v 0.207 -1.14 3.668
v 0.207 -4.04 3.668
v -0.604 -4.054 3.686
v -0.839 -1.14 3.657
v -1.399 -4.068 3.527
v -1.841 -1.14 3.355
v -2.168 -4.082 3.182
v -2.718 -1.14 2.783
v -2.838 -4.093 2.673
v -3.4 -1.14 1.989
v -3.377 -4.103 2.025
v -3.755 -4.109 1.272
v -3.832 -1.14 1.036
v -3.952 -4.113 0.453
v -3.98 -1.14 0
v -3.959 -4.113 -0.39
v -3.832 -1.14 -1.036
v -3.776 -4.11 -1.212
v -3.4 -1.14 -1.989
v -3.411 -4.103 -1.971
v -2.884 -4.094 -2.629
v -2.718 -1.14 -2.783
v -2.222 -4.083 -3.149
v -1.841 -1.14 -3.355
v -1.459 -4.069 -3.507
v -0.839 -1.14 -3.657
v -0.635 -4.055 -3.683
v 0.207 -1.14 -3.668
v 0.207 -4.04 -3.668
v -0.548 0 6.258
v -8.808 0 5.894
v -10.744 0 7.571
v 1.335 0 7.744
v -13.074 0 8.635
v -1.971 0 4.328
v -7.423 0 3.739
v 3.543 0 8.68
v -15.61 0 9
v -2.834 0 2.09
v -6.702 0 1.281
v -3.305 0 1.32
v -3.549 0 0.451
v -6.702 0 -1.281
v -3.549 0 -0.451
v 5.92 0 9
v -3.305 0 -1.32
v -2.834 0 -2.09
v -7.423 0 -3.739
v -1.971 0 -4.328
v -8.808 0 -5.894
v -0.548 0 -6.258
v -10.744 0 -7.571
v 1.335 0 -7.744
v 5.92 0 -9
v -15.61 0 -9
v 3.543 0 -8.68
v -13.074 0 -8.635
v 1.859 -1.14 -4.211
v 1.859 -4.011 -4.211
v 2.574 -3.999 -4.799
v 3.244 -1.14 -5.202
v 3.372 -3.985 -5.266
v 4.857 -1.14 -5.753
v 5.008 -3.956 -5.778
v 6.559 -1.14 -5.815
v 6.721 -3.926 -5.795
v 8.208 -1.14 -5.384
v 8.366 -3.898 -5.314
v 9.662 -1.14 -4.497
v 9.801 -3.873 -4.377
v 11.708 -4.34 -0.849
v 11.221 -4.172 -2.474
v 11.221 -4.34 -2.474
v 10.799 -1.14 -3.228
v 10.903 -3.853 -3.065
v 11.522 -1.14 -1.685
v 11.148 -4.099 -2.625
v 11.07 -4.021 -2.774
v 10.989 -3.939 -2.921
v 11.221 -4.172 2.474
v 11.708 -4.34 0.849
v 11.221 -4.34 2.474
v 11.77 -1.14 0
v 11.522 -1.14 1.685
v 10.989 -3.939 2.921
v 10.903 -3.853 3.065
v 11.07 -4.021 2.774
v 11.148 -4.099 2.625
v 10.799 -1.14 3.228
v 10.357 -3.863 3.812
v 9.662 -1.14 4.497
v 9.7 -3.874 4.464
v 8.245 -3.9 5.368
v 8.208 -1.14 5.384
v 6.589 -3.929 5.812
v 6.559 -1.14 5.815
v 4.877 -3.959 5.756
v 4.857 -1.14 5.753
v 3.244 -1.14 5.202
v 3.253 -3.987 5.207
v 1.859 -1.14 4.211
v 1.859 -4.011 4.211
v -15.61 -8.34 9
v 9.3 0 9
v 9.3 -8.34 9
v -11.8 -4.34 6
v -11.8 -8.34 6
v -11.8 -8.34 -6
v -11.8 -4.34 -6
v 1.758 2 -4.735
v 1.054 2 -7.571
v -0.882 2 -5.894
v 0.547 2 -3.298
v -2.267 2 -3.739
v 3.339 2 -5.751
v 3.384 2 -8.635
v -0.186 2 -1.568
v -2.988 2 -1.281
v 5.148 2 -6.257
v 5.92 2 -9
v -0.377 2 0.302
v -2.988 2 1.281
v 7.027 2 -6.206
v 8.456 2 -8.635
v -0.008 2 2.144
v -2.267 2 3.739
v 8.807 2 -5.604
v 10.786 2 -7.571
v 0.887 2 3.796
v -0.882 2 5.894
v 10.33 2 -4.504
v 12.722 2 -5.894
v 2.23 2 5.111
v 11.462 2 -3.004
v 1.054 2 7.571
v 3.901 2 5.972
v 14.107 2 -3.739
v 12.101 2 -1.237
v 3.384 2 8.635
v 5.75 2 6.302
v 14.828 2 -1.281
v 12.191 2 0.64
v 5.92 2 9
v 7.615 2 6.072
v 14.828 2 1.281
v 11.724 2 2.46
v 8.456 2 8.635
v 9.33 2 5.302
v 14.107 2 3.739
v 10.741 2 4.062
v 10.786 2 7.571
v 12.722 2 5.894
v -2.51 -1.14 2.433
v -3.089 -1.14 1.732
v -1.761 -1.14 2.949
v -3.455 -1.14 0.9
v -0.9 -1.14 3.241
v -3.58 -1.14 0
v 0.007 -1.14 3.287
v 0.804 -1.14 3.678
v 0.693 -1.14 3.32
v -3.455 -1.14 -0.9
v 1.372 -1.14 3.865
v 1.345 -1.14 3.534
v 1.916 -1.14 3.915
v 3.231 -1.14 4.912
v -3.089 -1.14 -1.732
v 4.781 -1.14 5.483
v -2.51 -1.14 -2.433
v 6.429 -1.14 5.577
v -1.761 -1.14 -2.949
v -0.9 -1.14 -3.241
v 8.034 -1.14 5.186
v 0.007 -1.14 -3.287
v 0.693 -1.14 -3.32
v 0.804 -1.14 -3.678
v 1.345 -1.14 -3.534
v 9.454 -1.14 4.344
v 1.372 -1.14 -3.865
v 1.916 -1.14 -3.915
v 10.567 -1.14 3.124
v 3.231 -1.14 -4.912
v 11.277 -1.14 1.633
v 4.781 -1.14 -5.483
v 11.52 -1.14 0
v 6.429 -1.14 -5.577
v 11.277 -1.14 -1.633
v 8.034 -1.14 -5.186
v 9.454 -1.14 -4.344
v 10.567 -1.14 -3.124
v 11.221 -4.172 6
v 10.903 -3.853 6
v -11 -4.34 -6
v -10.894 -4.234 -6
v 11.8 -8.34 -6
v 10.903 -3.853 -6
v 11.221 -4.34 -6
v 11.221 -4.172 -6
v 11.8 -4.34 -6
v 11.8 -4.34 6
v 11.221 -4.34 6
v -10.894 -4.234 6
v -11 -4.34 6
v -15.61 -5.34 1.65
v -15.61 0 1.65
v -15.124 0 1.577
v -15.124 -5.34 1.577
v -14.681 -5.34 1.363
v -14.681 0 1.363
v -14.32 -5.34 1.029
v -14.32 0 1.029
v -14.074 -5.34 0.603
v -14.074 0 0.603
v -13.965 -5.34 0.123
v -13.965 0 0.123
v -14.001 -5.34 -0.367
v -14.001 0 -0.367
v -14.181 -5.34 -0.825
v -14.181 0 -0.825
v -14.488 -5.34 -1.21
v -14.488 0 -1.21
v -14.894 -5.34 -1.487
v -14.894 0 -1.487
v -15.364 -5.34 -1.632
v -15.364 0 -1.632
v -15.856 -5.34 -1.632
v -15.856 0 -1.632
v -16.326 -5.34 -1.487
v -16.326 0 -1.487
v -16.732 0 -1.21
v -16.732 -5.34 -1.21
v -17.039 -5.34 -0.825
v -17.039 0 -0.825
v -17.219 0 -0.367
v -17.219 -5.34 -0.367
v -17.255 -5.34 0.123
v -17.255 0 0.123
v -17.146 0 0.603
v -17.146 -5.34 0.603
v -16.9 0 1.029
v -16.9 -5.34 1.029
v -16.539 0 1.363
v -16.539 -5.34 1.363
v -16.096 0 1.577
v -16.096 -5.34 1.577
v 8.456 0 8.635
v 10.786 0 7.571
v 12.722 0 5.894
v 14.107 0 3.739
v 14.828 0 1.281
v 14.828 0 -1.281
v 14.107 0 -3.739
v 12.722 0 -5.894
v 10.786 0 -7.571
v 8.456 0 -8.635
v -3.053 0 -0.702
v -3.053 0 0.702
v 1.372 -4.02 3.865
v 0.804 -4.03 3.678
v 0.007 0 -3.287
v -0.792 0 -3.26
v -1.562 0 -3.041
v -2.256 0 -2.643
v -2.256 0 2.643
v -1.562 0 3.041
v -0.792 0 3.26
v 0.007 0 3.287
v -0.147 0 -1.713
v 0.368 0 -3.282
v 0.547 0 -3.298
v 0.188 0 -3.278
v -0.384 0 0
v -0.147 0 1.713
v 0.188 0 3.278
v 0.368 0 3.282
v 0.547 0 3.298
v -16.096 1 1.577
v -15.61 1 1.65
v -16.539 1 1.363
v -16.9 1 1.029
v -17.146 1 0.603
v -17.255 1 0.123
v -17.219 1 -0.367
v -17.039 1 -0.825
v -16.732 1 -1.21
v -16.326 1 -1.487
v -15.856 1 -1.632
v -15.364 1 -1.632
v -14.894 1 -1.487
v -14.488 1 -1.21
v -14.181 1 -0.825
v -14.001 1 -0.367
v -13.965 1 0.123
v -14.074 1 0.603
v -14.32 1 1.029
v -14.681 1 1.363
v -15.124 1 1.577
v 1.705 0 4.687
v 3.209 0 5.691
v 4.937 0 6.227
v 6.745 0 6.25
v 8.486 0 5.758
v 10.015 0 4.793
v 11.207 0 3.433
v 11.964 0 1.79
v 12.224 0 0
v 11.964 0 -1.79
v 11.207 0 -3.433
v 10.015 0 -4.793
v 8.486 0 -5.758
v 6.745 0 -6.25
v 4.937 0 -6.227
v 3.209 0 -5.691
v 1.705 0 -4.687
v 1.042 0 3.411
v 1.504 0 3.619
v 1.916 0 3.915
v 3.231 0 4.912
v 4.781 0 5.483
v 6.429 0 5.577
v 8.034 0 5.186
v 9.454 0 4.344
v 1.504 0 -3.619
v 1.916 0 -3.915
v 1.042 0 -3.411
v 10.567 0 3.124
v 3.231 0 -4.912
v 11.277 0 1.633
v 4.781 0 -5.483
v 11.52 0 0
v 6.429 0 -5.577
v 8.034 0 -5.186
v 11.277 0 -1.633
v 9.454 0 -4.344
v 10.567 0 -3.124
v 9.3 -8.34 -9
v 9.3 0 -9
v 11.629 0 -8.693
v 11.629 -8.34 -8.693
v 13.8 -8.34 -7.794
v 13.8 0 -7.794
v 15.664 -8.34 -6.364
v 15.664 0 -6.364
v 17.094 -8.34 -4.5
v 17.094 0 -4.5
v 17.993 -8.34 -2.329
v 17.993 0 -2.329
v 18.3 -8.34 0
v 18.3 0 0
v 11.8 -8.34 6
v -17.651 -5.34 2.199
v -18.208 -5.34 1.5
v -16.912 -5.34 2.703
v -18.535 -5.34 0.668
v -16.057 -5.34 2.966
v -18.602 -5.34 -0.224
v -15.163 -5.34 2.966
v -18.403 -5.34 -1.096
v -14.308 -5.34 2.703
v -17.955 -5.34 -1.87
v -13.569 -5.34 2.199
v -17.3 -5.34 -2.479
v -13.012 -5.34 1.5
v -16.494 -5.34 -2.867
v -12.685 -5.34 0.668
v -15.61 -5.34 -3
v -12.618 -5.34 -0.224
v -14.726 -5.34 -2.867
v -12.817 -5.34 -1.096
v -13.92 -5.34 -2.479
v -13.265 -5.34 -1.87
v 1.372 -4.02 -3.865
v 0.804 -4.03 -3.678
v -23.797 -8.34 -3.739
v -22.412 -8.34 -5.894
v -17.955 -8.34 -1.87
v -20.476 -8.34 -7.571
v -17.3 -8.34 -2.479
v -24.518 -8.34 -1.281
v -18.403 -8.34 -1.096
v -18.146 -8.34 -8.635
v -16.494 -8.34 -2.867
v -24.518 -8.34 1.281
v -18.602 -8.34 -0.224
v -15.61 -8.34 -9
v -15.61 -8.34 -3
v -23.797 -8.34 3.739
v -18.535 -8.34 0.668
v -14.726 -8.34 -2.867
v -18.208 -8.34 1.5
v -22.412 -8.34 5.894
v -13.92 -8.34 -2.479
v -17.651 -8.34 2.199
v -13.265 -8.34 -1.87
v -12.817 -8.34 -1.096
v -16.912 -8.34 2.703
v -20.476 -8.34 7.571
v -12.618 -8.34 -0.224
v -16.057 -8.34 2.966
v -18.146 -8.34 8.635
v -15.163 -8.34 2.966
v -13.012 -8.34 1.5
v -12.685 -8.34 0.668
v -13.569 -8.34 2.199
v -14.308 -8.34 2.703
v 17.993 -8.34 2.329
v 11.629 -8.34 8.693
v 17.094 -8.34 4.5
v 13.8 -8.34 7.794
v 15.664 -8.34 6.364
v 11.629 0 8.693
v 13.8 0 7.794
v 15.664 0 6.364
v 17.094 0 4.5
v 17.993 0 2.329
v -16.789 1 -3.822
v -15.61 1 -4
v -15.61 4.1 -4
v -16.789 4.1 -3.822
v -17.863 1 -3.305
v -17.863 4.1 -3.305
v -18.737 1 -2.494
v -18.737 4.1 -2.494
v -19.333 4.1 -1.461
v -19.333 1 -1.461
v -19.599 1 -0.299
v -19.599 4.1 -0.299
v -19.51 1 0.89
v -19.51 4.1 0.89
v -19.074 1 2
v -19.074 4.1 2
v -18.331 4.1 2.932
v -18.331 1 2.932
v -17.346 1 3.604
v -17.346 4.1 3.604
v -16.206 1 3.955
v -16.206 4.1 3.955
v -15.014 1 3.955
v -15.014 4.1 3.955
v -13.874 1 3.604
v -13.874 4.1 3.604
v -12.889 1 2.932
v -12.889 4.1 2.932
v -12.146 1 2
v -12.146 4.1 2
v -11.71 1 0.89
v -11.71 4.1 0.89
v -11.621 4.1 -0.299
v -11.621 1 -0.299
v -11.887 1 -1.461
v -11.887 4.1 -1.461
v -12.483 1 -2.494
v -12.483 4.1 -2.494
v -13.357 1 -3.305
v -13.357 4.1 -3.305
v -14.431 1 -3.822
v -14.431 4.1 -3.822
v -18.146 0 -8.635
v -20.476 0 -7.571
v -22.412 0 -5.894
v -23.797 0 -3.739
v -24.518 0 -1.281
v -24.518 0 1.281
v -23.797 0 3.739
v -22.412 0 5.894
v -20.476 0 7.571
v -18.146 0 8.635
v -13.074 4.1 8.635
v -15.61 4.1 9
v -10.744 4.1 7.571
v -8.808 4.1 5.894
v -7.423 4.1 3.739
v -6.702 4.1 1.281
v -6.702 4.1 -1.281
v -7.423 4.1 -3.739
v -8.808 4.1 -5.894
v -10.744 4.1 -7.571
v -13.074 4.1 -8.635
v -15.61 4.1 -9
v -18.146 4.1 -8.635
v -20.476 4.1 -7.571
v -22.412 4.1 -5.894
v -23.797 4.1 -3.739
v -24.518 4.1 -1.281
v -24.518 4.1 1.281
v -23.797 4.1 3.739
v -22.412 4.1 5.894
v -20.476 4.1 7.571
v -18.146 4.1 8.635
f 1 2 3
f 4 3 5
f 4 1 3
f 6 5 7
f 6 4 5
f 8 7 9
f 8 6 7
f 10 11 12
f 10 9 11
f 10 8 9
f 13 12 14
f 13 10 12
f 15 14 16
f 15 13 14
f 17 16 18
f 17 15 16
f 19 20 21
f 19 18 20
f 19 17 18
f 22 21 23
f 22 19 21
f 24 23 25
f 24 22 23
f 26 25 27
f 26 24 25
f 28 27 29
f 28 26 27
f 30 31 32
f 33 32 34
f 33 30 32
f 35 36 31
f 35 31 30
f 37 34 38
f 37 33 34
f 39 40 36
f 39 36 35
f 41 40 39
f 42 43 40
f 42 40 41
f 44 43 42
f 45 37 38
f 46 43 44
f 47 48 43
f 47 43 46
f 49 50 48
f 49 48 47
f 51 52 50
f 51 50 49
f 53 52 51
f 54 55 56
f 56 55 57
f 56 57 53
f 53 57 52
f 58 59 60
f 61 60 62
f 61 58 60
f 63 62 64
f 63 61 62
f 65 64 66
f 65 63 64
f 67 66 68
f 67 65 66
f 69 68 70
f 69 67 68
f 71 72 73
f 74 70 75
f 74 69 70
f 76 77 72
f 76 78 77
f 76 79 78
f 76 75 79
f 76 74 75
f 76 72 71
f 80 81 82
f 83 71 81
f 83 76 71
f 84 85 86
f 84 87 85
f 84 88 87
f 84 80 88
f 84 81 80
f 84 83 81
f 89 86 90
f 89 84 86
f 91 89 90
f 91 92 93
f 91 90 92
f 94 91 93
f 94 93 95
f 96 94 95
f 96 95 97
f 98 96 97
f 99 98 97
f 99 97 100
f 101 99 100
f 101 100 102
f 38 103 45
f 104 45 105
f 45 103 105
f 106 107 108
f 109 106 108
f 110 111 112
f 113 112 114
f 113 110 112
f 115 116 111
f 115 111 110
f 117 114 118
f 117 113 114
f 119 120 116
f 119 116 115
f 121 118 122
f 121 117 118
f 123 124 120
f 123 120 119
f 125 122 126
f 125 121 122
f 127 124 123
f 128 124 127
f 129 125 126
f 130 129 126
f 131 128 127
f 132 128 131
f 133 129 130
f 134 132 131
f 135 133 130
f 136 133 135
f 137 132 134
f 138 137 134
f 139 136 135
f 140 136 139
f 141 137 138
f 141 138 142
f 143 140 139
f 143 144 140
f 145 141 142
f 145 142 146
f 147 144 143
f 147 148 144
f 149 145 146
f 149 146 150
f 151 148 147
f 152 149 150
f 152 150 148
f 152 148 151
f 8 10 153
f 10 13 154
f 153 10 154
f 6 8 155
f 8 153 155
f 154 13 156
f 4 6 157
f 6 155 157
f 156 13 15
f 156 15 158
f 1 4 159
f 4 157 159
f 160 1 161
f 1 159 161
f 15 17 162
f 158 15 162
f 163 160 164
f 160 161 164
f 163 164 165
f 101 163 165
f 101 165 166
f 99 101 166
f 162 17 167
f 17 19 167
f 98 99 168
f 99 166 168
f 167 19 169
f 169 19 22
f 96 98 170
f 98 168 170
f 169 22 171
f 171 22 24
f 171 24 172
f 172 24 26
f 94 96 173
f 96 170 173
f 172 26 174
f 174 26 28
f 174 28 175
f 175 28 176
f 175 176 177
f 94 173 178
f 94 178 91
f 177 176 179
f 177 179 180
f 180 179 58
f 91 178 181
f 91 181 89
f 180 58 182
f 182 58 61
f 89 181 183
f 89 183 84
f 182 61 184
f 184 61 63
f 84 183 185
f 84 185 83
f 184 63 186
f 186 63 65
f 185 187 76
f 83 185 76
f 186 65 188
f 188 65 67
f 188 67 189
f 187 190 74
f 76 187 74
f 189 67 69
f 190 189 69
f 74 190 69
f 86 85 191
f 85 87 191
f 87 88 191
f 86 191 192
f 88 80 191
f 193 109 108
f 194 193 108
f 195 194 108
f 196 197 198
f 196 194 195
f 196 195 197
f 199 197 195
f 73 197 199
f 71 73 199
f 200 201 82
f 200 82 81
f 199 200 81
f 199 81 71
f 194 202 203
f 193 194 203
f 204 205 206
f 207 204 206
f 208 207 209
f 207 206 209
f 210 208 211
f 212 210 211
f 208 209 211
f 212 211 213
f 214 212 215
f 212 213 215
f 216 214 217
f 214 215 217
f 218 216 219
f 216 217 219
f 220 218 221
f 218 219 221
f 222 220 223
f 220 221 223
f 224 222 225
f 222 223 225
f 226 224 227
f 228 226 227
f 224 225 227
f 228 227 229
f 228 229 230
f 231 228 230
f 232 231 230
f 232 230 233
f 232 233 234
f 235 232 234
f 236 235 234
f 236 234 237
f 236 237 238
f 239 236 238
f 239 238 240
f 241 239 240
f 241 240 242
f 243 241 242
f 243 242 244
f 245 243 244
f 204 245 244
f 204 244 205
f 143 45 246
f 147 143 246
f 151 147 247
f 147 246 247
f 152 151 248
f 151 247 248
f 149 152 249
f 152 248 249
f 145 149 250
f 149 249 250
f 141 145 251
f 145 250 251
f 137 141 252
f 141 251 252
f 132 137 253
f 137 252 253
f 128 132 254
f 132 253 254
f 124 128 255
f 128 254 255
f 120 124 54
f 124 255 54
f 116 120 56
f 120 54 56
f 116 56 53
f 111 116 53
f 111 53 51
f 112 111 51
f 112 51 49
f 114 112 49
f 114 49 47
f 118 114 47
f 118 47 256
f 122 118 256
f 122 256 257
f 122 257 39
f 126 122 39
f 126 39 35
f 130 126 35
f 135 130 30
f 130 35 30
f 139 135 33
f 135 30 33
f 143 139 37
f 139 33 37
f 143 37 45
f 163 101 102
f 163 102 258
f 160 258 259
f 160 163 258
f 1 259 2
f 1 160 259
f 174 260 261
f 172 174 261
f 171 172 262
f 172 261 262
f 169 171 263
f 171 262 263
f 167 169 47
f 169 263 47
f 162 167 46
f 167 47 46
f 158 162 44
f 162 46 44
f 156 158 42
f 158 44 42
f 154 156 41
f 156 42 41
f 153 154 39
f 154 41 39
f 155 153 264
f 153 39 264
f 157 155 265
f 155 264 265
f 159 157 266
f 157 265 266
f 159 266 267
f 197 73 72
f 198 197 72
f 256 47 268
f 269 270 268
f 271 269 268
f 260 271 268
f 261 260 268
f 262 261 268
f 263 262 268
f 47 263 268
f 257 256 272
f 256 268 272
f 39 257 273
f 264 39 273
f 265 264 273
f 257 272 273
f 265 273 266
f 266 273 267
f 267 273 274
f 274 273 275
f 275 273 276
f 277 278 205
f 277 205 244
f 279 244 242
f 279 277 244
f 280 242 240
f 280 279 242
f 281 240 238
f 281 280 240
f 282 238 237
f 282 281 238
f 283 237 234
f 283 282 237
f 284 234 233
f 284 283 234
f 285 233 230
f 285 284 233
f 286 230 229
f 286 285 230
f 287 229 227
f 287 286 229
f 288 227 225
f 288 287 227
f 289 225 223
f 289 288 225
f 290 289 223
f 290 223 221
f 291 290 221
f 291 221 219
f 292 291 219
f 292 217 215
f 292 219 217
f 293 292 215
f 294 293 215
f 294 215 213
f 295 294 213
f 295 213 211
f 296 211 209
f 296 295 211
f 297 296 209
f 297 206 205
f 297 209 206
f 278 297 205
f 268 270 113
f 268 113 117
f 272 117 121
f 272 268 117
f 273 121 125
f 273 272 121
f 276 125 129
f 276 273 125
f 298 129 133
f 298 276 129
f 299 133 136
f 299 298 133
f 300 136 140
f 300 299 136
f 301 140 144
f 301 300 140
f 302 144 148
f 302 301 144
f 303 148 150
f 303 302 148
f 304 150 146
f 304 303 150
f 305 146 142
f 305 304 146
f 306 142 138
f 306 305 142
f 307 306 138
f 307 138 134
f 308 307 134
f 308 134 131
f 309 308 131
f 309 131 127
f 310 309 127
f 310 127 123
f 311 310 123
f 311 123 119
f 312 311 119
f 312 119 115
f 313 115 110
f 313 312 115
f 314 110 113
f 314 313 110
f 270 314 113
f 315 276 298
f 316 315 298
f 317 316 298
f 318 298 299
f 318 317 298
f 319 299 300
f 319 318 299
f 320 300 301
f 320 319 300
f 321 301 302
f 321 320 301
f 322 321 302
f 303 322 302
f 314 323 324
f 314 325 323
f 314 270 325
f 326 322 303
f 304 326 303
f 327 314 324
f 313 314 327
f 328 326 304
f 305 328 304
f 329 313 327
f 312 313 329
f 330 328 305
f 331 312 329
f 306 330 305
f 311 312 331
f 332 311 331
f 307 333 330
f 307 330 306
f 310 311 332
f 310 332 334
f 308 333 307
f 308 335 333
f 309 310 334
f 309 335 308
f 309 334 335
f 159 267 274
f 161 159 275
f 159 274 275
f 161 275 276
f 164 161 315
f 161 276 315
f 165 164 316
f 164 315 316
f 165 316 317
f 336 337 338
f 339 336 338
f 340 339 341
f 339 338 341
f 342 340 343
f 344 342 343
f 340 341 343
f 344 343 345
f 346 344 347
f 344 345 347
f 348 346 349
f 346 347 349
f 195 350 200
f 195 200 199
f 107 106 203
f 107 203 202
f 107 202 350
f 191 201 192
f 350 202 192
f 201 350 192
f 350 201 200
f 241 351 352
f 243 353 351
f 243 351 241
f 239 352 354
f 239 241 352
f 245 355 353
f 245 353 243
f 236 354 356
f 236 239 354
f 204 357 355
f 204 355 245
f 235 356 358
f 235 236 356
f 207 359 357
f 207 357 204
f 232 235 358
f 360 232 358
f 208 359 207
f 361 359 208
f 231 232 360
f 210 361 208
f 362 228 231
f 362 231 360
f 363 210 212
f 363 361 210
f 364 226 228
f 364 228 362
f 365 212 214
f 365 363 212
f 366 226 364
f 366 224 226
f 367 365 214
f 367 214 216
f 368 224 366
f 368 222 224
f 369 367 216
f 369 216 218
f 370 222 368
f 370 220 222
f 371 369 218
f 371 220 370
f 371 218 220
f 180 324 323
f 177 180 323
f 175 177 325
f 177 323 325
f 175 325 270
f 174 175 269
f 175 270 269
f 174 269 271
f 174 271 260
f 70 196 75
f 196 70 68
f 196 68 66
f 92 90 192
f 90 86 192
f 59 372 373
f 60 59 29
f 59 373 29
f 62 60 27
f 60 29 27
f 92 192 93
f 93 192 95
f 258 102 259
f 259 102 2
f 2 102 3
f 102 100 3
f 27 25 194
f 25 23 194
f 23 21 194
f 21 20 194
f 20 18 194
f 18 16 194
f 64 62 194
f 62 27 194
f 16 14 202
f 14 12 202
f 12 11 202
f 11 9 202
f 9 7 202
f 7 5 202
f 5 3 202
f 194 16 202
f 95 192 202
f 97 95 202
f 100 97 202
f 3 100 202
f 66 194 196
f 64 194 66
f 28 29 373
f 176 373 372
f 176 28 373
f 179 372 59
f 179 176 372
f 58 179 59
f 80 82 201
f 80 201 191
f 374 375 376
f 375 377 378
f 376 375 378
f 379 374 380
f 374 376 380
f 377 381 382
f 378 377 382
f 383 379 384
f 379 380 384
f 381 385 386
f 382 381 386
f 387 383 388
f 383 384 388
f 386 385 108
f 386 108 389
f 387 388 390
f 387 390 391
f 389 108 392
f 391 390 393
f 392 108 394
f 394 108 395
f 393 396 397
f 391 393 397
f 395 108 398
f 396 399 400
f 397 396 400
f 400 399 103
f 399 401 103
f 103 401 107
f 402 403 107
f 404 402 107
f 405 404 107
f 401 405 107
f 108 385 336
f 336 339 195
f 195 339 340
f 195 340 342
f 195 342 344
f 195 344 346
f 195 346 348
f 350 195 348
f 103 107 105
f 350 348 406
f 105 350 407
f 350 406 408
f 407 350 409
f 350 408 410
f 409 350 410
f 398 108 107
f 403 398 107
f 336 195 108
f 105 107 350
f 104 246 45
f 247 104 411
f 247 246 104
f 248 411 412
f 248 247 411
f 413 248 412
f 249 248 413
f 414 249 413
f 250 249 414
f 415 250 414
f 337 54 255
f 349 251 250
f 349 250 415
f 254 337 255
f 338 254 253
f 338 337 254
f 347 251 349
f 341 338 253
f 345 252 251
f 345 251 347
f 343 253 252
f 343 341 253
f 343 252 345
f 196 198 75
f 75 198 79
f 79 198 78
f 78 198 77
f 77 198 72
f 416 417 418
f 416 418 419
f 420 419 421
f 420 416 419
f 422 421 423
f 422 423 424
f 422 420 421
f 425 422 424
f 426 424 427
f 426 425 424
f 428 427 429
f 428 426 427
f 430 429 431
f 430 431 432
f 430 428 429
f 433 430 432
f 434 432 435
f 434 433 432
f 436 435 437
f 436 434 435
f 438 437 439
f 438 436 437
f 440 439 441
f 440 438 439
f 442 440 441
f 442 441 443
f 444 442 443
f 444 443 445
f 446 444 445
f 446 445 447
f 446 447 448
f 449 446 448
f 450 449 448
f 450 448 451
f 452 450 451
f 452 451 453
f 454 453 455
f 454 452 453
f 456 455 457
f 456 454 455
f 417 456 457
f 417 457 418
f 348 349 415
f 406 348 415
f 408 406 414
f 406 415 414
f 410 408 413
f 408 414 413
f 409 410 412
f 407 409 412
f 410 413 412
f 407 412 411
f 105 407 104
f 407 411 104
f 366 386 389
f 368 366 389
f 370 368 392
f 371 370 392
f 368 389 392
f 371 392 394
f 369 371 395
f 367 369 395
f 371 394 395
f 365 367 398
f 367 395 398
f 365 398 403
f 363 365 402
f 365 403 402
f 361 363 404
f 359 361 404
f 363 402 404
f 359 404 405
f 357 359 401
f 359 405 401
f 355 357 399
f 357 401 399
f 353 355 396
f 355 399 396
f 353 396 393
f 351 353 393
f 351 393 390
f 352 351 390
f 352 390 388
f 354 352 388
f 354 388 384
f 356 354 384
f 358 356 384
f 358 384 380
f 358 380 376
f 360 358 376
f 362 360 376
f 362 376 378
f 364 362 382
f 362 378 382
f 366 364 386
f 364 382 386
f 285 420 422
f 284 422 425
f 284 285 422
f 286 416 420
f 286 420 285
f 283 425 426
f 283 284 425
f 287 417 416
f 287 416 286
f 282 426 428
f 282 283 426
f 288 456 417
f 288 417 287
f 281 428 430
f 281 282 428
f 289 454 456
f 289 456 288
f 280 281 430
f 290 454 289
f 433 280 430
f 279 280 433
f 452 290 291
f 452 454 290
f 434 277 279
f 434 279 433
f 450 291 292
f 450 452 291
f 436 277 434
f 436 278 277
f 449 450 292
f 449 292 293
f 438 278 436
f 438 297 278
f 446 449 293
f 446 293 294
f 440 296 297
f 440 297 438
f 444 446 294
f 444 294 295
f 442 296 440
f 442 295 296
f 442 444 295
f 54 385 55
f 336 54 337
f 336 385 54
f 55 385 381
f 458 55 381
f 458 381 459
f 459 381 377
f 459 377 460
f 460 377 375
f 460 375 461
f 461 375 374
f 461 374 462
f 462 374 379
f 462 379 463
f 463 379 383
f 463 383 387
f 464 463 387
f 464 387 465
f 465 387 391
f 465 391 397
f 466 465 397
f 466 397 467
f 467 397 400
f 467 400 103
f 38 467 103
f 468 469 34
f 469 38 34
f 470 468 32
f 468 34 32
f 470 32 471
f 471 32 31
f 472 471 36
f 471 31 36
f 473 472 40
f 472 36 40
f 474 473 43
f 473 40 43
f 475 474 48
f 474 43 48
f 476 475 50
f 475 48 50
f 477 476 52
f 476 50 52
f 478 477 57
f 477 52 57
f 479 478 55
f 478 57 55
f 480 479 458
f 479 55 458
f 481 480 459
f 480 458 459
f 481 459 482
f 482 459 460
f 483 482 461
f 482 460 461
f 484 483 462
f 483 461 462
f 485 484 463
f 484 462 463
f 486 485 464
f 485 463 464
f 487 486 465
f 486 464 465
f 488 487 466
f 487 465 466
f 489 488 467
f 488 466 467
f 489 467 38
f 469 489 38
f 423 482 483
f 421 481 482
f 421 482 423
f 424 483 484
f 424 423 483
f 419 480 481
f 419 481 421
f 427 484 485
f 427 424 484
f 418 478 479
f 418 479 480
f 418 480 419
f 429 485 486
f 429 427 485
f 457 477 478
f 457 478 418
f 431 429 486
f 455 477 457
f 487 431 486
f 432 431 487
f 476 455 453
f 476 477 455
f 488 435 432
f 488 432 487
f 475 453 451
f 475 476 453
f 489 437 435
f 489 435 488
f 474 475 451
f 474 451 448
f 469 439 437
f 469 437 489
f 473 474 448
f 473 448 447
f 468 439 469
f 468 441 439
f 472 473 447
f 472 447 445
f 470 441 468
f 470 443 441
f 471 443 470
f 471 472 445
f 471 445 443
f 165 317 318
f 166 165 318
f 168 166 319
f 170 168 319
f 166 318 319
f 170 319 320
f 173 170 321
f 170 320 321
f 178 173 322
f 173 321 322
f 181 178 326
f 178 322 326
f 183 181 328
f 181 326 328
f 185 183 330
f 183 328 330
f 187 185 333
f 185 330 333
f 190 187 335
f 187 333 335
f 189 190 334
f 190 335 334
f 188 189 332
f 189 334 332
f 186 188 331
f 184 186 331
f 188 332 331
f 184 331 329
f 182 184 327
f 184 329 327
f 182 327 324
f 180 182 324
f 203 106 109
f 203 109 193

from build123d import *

# Parameters (mm, degrees)
SKETCH_1_W          = 23.6
SKETCH_1_H          = 12
EXTRUDE_1_DEPTH     = 1.14
SKETCH_2_W          = 23.6
SKETCH_2_H          = 12
EXTRUDE_2_DEPTH     = 3.2
CUT_EXTRUDE_1_DEPTH = 18.380322206
EXTRUDE_3_DEPTH     = 3
EXTRUDE_4_DEPTH     = 3
EXTRUDE_START       = -8.34
SKETCH_6_W          = 4.5
SKETCH_6_H          = 18
EXTRUDE_6_DEPTH     = 6
SKETCH_9_W          = 18
SKETCH_9_H          = 6
EXTRUDE_8_DEPTH     = 4
SKETCH_11_W         = 8.5
SKETCH_11_H         = 18
EXTRUDE_11_DEPTH    = 2.34
SKETCH_13_W         = 18
SKETCH_13_H         = 6
EXTRUDE_12_DEPTH    = 2
SKETCH_14_W         = 18
SKETCH_14_H         = 8.34
EXTRUDE_13_DEPTH    = 8
SKETCH_15_W         = 6.5
SKETCH_15_H         = 18
EXTRUDE_14_DEPTH    = 2.34
SKETCH_12_R         = 1.65
CUT_EXTRUDE_2_DEPTH = 8.34
SKETCH_16_R         = 3
CUT_EXTRUDE_3_DEPTH = 3
SKETCH_17_R         = 9
SKETCH_17_R_2       = 6.303921286
EXTRUDE_15_DEPTH    = 2
SKETCH_18_R         = 9
EXTRUDE_16_DEPTH    = 1
CUT_EXTRUDE_START   = -10
SKETCH_19_R         = 1.65
CUT_EXTRUDE_4_DEPTH = 10
CUT_EXTRUDE_START_2 = -8.34
CUT_EXTRUDE_5_DEPTH = 8.34
CUT_EXTRUDE_6_DEPTH = 8.34
SKETCH_23_R         = 9
SKETCH_23_R_2       = 4
EXTRUDE_17_DEPTH    = 3.1


with BuildPart() as part:
    # 草图1 → 凸台-拉伸1 (new body)
    with BuildSketch(Plane(origin=(0, 0, 0), x_dir=(1, 0, 0), z_dir=(0, 1, 0))):
        Rectangle(SKETCH_1_W, SKETCH_1_H)
        with BuildLine():
            ThreePointArc((0.007454552, 3.287456445), (-3.58, 0), (0.007454552, -3.287456445))
            ThreePointArc((0.007454552, -3.287456445), (1.025918755, -3.405297551), (1.915651286, -3.91474027))
            ThreePointArc((1.915651286, -3.91474027), (11.52, 0), (1.915651286, 3.91474027))
            ThreePointArc((1.915651286, 3.91474027), (1.025918755, 3.405297551), (0.007454552, 3.287456445))
        make_face(mode=Mode.SUBTRACT)
    extrude(amount=-EXTRUDE_1_DEPTH)

    # 草图2 → 凸台-拉伸2 (add)
    with BuildSketch(Plane.XZ.offset(1.14)):
        Rectangle(SKETCH_2_W, SKETCH_2_H)
        with BuildLine():
            ThreePointArc((1.858985772, -4.210779433), (11.77, 0), (1.858985772, 4.210779433))
            ThreePointArc((1.858985772, 4.210779433), (1.095204485, 3.750394966), (0.20723472, 3.667778937))
            ThreePointArc((0.20723472, 3.667778937), (-3.98, 0), (0.20723472, -3.667778937))
            ThreePointArc((0.20723472, -3.667778937), (1.095204485, -3.750394966), (1.858985772, -4.210779433))
        make_face(mode=Mode.SUBTRACT)
    extrude(amount=EXTRUDE_2_DEPTH)

    # 草图3 → 切除-拉伸1 (cut, through all)
    with BuildSketch(Plane.XY.offset(6)):
        Polygon((-10.893933983, -4.233933983), (-11, -4.34), (11.220943823, -4.34), (11.220943823, -4.171669574), (10.902745772, -3.853471522), align=None)
    extrude(amount=-CUT_EXTRUDE_1_DEPTH, mode=Mode.SUBTRACT)

    # 草图4 → 凸台-拉伸3 (add)
    with BuildSketch(Plane.XY.offset(6)):
        Polygon((-11.8, -4.34), (-11.8, -8.34), (11.8, -8.34), (11.8, -4.34), (11.8, 0), (-11.8, 0), align=None)
    extrude(amount=EXTRUDE_3_DEPTH)

    # 草图5 → 凸台-拉伸4 (add)
    with BuildSketch(Plane(origin=(0, 0, -6), x_dir=(-1, 0, 0), z_dir=(0, 0, -1))):
        Polygon((11.8, -8.34), (-11.8, -8.34), (-11.8, -4.34), (-11.8, 0), (11.8, 0), (11.8, -4.34), align=None)
    extrude(amount=EXTRUDE_4_DEPTH)

    # 草图6 → 凸台-拉伸6 (add)
    with BuildSketch(Plane(origin=(0, 0, 0), x_dir=(1, 0, 0), z_dir=(0, 1, 0)).offset(EXTRUDE_START)):
        with Locations((14.05, 0)):
            Rectangle(SKETCH_6_W, SKETCH_6_H)
        with Locations((-14.05, 0)):
            Rectangle(SKETCH_6_W, SKETCH_6_H)
    extrude(amount=EXTRUDE_6_DEPTH)

    # 草图9 → 凸台-拉伸8 (add)
    with BuildSketch(Plane.ZY.offset(16.3)):
        with Locations((0, -5.34)):
            Rectangle(SKETCH_9_W, SKETCH_9_H)
    extrude(amount=EXTRUDE_8_DEPTH)

    # 草图11 → 凸台-拉伸11 (add)
    with BuildSketch(Plane(origin=(0, -2.34, 0), x_dir=(1, 0, 0), z_dir=(0, 1, 0))):
        with Locations((-16.05, 0)):
            Rectangle(SKETCH_11_W, SKETCH_11_H)
    extrude(amount=EXTRUDE_11_DEPTH)

    # 草图13 → 凸台-拉伸12 (add)
    with BuildSketch(Plane(origin=(16.3, 0, 0), x_dir=(0, 0, -1), z_dir=(1, 0, 0))):
        with Locations((0, -5.34)):
            Rectangle(SKETCH_13_W, SKETCH_13_H)
    extrude(amount=EXTRUDE_12_DEPTH)

    # 草图14 → 凸台-拉伸13 (add)
    with BuildSketch(Plane.ZY.offset(20.3)):
        with Locations((0, -4.17)):
            Rectangle(SKETCH_14_W, SKETCH_14_H)
    extrude(amount=EXTRUDE_13_DEPTH)

    # 草图15 → 凸台-拉伸14 (add)
    with BuildSketch(Plane(origin=(0, -2.34, 0), x_dir=(1, 0, 0), z_dir=(0, 1, 0))):
        with Locations((15.05, 0)):
            Rectangle(SKETCH_15_W, SKETCH_15_H)
    extrude(amount=EXTRUDE_14_DEPTH)

    # 草图12 → 切除-拉伸2 (cut)
    with BuildSketch(Plane(origin=(0, 0, 0), x_dir=(1, 0, 0), z_dir=(0, 1, 0))):
        with Locations(Location((-15.61, 0, 0), (0, 0, 270))):
            Circle(SKETCH_12_R)
    extrude(amount=-CUT_EXTRUDE_2_DEPTH, mode=Mode.SUBTRACT)

    # 草图16 → 切除-拉伸3 (cut)
    with BuildSketch(Plane.XZ.offset(8.34)):
        with Locations(Location((-15.61, 0, 0), (0, 0, 270))):
            Circle(SKETCH_16_R)
    extrude(amount=-CUT_EXTRUDE_3_DEPTH, mode=Mode.SUBTRACT)

    # 草图17 → 凸台-拉伸15 (add)
    with BuildSketch(Plane(origin=(0, 0, 0), x_dir=(1, 0, 0), z_dir=(0, 1, 0))):
        with Locations(Location((5.92, 0, 0), (0, 0, 270))):
            Circle(SKETCH_17_R)
        with Locations(Location((5.92, 0, 0), (0, 0, 148.458888043))):
            Circle(SKETCH_17_R_2, mode=Mode.SUBTRACT)
    extrude(amount=EXTRUDE_15_DEPTH)

    # 草图18 → 凸台-拉伸16 (add)
    with BuildSketch(Plane(origin=(0, 0, 0), x_dir=(1, 0, 0), z_dir=(0, 1, 0))):
        with Locations(Location((-15.61, 0, 0), (0, 0, 270))):
            Circle(SKETCH_18_R)
    extrude(amount=EXTRUDE_16_DEPTH)

    # 草图19 → 切除-拉伸4 (cut)
    with BuildSketch(Plane.XZ.offset(CUT_EXTRUDE_START)):
        with Locations(Location((-15.61, 0, 0), (0, 0, 90))):
            Circle(SKETCH_19_R)
    extrude(amount=CUT_EXTRUDE_4_DEPTH, mode=Mode.SUBTRACT)

    # 草图20 → 切除-拉伸5 (cut)
    with BuildSketch(Plane(origin=(0, 0, 0), x_dir=(1, 0, 0), z_dir=(0, 1, 0)).offset(CUT_EXTRUDE_START_2)):
        with BuildLine():
            Line((-15.61, -9), (-28.3, -9))
            Line((-28.3, -9), (-28.3, 9))
            Line((-28.3, 9), (-15.61, 9))
            ThreePointArc((-15.61, 9), (-24.61, 0), (-15.61, -9))
        make_face()
    extrude(amount=CUT_EXTRUDE_5_DEPTH, mode=Mode.SUBTRACT)

    # 草图21 → 切除-拉伸6 (cut)
    with BuildSketch(Plane(origin=(0, 0, 0), x_dir=(1, 0, 0), z_dir=(0, 1, 0))):
        with BuildLine():
            ThreePointArc((9.3, 9), (15.663961016, 6.363961045), (18.3, 4.1e-08))
            Line((18.3, 4.1e-08), (18.3, 9))
            Line((18.3, 9), (12.11, 9))
            Line((12.11, 9), (9.3, 9))
        make_face()
        with BuildLine():
            ThreePointArc((18.3, 4.1e-08), (15.663961045, -6.363961016), (9.3, -9))
            Line((9.3, -9), (18.3, -9))
            Line((18.3, -9), (18.3, 4.1e-08))
        make_face()
    extrude(amount=-CUT_EXTRUDE_6_DEPTH, mode=Mode.SUBTRACT)

    # 草图23 → 凸台-拉伸17 (add)
    with BuildSketch(Plane(origin=(0, 1, 0), x_dir=(1, 0, 0), z_dir=(0, 1, 0))):
        with Locations(Location((-15.61, 0, 0), (0, 0, 270))):
            Circle(SKETCH_23_R)
        with Locations(Location((-15.61, 0, 0), (0, 0, 90))):
            Circle(SKETCH_23_R_2, mode=Mode.SUBTRACT)
    extrude(amount=EXTRUDE_17_DEPTH)


solid = part.part
